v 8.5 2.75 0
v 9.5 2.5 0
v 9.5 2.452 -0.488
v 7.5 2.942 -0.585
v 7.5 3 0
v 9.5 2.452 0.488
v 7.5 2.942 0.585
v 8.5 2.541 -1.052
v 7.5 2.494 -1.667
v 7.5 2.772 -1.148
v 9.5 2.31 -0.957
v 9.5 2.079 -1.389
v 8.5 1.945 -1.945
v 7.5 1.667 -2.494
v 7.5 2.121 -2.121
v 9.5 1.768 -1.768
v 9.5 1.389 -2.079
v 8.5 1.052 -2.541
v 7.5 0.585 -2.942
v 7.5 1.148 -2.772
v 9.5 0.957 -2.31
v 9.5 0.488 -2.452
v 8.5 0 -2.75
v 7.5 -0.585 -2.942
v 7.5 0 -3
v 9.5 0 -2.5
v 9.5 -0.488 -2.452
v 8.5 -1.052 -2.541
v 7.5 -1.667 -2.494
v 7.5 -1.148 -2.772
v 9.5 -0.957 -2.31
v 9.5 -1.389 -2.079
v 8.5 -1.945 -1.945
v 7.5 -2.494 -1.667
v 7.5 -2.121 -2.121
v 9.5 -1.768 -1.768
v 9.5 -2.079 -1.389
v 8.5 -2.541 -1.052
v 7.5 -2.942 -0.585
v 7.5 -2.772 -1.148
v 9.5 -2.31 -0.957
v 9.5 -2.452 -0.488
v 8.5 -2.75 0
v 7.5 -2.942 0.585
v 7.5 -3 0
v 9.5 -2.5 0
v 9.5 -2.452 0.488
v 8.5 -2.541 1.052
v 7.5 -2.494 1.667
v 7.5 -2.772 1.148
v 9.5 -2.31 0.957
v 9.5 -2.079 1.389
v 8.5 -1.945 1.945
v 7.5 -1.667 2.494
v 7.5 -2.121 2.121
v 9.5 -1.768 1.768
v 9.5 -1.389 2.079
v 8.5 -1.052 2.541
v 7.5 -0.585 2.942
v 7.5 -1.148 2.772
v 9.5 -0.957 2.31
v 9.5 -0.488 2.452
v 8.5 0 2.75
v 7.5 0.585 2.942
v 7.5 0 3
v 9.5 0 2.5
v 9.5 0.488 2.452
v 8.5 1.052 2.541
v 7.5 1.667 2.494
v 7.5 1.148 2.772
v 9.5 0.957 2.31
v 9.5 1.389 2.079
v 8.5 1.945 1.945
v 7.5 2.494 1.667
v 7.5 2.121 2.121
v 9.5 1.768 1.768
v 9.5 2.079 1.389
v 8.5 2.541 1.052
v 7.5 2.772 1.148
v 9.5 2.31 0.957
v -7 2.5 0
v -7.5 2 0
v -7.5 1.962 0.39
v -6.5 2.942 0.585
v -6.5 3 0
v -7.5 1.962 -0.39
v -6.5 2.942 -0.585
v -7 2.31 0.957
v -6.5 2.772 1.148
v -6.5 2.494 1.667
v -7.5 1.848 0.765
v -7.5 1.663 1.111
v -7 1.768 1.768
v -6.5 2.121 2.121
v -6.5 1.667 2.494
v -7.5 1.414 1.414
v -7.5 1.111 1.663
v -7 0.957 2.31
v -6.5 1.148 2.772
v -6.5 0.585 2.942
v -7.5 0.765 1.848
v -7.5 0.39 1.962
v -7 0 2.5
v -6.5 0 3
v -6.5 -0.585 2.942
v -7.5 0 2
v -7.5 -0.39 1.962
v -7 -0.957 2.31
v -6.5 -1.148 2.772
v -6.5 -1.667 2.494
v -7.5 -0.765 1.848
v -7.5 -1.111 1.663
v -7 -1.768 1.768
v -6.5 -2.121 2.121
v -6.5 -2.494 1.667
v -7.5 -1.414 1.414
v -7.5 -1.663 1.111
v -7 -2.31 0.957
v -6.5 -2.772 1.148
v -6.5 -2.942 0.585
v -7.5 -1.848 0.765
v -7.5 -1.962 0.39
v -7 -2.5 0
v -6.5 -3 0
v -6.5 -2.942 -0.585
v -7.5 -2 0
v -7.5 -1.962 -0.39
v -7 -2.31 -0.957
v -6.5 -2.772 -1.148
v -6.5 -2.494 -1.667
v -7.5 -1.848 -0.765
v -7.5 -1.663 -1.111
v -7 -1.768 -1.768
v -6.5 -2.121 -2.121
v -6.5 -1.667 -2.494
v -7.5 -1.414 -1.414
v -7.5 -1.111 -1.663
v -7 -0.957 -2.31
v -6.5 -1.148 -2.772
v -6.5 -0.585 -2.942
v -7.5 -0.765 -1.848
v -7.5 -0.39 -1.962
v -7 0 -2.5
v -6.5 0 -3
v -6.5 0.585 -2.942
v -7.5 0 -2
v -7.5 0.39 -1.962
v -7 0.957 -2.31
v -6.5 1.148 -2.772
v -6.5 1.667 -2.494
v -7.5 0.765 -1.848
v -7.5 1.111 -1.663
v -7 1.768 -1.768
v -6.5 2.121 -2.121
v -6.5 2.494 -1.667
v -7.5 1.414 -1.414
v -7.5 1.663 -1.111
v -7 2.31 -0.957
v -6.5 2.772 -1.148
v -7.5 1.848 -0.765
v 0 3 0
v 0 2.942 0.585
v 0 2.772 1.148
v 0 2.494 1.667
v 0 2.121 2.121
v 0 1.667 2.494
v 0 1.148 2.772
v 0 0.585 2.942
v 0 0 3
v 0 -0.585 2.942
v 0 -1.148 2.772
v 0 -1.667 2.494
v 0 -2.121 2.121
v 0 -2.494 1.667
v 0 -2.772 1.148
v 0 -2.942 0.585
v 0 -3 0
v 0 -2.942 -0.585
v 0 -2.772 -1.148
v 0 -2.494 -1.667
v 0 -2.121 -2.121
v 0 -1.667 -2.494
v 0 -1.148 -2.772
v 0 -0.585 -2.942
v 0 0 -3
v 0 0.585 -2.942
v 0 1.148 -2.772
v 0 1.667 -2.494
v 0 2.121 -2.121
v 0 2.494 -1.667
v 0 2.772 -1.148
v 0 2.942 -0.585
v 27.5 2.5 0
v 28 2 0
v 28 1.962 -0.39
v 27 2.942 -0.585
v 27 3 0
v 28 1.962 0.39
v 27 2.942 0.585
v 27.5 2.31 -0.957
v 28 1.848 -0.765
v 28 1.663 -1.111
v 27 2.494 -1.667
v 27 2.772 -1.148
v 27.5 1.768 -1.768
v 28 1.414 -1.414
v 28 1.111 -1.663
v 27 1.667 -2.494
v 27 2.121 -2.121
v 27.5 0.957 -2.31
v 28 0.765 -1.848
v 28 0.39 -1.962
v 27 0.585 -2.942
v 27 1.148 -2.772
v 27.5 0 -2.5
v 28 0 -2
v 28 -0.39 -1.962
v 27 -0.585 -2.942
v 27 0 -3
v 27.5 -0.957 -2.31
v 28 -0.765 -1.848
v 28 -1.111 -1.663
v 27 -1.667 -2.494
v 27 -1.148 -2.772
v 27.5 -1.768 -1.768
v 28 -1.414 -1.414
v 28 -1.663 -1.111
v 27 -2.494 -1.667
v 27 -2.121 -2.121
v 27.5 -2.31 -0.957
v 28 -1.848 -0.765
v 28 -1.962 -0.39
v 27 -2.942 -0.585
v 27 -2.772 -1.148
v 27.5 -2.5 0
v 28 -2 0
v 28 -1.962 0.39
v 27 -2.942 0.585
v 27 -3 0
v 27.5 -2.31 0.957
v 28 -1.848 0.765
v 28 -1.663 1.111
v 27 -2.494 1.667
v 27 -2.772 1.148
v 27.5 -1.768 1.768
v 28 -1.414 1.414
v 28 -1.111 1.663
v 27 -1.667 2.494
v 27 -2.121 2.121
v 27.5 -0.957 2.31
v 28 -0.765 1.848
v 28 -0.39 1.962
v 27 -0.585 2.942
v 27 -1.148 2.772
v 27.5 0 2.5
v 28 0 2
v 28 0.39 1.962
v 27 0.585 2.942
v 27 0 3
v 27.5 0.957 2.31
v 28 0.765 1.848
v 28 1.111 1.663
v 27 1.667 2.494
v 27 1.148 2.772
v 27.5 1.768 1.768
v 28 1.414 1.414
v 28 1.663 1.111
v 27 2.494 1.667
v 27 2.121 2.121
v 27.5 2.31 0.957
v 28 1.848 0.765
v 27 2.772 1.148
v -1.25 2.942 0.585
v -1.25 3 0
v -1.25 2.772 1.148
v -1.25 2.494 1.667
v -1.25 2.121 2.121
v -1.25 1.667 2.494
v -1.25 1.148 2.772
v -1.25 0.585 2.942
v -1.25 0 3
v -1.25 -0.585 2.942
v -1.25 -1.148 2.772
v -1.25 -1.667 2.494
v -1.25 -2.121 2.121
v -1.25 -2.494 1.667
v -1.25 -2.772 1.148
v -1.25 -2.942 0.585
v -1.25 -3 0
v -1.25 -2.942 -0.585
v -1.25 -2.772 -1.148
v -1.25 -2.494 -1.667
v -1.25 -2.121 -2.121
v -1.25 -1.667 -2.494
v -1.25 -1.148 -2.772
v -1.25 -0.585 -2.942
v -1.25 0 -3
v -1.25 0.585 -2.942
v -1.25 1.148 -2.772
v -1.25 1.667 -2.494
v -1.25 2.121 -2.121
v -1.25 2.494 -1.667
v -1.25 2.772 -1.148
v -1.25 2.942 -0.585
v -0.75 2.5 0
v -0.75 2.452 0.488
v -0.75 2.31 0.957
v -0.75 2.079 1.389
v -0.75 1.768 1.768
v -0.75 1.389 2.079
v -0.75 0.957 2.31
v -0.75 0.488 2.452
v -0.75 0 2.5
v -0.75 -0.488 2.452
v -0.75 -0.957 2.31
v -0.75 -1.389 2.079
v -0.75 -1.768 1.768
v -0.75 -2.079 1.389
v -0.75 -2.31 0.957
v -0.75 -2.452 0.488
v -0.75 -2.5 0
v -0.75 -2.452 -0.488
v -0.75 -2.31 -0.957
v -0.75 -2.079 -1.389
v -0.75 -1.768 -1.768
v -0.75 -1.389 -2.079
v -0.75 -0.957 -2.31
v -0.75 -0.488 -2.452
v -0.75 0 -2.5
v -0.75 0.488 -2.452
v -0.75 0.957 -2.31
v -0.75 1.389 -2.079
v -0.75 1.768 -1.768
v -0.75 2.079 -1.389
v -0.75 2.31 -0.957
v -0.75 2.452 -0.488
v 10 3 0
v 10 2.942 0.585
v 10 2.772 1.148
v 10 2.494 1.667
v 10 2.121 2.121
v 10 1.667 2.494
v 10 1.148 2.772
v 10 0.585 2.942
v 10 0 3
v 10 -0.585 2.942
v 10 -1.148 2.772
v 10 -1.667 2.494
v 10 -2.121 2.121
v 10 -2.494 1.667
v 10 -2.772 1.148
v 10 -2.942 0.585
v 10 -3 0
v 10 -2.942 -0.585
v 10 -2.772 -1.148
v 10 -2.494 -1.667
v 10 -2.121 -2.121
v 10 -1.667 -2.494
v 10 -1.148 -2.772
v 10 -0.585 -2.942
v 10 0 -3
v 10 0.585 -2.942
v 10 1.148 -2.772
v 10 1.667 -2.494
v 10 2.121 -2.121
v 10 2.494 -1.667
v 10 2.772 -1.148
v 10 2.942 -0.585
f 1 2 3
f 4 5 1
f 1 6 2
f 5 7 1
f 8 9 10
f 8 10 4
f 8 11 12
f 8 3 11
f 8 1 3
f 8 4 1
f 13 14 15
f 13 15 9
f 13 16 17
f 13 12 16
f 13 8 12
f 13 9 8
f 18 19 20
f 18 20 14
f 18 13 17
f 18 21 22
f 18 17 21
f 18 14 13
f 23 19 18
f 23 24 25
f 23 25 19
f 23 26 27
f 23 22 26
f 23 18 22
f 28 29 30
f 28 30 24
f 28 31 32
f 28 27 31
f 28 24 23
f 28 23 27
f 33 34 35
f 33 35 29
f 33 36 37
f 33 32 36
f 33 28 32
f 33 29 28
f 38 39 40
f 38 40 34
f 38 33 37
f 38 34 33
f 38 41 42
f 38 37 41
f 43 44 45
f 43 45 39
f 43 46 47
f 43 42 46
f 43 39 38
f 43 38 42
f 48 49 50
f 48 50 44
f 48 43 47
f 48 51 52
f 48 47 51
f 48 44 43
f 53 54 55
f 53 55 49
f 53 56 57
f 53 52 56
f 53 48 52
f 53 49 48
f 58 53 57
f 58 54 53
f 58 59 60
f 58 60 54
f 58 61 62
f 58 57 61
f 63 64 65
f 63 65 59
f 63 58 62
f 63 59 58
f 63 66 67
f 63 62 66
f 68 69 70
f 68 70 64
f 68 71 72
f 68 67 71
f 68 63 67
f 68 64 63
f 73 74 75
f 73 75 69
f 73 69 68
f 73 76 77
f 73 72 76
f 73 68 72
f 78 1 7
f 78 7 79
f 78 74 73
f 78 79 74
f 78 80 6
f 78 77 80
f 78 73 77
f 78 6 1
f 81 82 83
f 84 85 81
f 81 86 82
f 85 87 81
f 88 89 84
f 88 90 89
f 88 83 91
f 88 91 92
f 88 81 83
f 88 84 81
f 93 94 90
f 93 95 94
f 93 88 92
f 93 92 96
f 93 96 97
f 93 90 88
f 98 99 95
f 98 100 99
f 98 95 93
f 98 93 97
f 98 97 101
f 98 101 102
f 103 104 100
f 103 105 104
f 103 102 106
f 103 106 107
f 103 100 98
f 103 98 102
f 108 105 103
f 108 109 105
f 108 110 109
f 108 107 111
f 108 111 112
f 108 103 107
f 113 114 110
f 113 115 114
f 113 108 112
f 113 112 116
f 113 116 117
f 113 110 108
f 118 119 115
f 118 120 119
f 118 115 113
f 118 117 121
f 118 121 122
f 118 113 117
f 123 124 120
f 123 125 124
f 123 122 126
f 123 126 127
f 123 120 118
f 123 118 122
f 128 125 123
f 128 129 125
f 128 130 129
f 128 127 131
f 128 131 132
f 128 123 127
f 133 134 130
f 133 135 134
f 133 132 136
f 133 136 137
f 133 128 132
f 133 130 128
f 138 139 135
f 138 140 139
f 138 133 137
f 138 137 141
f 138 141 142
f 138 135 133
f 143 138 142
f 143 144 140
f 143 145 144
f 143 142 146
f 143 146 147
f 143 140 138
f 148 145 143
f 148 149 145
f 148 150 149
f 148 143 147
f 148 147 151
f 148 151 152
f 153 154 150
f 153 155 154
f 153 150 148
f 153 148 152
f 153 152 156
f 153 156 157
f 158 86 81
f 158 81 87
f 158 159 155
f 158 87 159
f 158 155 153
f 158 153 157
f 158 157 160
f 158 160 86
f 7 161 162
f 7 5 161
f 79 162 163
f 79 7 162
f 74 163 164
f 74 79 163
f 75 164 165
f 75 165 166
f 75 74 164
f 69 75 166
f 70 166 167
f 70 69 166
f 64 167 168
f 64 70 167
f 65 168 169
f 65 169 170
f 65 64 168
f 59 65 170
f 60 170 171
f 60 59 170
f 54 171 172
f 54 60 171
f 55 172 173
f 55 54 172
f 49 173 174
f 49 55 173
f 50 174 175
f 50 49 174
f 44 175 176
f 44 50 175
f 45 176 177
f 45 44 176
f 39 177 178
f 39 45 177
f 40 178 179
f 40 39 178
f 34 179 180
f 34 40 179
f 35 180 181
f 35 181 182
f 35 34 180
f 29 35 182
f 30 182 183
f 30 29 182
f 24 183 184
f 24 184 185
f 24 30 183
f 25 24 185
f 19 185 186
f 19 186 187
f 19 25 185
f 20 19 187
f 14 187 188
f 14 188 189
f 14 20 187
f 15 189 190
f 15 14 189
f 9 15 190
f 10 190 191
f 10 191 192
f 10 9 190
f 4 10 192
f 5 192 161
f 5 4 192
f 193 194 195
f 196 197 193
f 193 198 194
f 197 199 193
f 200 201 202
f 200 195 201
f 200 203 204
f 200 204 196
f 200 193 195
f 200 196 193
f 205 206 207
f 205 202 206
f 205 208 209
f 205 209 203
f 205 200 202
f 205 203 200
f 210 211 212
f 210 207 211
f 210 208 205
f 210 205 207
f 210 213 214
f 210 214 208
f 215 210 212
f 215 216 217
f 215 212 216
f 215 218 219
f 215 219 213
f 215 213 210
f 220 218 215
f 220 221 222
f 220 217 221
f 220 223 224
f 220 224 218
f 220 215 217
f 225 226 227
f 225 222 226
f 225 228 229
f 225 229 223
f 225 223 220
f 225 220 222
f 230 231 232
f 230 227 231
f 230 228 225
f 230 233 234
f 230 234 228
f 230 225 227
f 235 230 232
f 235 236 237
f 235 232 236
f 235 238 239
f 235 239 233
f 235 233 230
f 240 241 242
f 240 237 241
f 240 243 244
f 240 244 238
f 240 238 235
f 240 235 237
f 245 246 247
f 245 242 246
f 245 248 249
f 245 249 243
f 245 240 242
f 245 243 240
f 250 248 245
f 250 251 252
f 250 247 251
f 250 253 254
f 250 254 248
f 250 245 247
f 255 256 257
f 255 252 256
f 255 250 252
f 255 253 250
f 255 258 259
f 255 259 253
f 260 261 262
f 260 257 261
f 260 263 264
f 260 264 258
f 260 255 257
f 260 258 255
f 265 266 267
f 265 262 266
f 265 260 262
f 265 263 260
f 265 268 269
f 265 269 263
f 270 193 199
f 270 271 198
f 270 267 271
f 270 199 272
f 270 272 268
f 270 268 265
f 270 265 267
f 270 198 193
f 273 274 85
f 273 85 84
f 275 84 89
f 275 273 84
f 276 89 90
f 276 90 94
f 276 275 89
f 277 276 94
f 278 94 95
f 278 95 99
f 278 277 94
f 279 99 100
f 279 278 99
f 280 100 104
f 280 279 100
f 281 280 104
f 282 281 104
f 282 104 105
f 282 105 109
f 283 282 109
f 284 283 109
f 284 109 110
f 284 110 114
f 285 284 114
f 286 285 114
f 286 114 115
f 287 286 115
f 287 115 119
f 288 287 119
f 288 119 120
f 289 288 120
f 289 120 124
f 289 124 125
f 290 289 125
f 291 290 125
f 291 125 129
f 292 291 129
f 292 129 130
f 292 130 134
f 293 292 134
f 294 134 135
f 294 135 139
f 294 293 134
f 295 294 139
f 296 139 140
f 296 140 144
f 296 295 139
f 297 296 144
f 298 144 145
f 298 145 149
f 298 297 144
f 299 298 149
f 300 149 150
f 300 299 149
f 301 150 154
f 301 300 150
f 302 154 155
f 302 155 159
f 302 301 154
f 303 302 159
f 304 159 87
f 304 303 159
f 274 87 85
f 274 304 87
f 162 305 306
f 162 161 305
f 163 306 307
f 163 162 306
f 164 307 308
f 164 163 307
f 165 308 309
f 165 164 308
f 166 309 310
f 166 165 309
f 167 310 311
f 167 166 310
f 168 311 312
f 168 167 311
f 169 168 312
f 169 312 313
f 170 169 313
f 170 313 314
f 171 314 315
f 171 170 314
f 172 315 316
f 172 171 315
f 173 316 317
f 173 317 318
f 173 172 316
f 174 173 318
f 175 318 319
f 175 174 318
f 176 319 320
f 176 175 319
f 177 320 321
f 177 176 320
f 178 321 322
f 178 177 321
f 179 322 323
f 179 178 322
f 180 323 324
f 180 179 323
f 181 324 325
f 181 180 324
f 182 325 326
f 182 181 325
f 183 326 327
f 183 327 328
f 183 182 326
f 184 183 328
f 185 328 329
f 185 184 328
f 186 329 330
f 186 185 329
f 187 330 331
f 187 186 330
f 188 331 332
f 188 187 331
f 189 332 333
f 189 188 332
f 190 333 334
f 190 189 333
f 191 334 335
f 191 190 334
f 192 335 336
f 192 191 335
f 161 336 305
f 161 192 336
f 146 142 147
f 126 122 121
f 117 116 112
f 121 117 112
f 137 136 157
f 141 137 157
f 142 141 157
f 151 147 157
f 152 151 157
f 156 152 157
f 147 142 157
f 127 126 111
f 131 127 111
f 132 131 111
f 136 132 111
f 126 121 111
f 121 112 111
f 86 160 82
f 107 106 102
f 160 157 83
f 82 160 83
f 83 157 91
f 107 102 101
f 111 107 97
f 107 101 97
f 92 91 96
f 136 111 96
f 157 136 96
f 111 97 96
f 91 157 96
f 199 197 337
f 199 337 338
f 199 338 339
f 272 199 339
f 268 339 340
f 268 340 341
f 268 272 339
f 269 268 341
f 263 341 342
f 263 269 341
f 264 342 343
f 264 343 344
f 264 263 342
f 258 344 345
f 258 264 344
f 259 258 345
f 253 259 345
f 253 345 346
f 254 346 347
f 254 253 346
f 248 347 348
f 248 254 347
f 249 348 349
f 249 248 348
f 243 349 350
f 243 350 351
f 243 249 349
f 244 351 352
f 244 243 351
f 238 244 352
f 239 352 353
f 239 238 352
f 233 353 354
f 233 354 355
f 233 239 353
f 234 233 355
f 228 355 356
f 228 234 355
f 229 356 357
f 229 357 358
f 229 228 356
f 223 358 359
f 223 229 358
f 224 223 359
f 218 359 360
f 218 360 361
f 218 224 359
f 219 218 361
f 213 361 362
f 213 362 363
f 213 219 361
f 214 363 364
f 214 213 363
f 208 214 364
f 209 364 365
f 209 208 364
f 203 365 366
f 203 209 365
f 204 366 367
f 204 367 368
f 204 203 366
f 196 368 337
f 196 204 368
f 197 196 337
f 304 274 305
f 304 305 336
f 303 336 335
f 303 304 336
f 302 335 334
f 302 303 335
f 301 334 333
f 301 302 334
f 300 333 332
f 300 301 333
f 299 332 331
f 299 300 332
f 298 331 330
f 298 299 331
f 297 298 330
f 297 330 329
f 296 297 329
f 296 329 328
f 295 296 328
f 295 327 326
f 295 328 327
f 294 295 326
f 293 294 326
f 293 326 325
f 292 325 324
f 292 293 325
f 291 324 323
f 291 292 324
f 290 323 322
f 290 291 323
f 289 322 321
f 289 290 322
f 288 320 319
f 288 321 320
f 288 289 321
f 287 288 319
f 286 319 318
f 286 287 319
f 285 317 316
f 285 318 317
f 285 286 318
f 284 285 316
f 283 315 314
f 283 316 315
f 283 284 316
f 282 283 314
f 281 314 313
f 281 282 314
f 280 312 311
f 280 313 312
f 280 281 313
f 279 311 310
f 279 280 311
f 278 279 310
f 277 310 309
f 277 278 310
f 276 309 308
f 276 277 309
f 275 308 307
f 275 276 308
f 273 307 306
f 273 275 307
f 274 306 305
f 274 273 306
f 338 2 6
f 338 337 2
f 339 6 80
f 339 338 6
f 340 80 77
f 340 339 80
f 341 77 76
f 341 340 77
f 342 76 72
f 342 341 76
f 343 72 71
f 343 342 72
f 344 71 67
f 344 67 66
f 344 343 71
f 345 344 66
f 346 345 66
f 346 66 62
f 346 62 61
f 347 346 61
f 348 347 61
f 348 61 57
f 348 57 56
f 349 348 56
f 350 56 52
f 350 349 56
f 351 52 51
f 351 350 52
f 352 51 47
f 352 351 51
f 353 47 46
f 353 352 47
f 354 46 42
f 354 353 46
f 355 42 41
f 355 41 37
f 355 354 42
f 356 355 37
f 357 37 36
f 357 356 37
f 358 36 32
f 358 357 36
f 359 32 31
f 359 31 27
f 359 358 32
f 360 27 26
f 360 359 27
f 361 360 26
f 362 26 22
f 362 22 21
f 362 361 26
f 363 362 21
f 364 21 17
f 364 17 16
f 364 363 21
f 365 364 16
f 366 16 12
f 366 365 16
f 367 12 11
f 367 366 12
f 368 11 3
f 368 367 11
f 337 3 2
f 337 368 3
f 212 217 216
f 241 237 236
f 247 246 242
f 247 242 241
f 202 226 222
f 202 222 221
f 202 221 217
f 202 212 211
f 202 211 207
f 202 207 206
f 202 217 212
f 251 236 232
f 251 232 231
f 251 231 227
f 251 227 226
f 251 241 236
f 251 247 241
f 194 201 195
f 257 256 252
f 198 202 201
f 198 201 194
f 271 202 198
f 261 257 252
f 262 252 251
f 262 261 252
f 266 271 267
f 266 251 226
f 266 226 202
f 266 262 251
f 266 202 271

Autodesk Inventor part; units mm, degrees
ref_plane "YZ Plane" through (0, 0, 0) normal (1, 0, 0) x (0, 1, 0)
ref_plane "XZ Plane" through (0, 0, 0) normal (0, 1, 0) x (-1, 0, 0)
sketch "Szkic1" plane through (0, 0, 0) normal (0, 0, 1) x (1, 0, 0)
  line L0 (28, 3) -> (28, 0)
  line L1 (-7.5, 0) -> (28, 0)
  line L2 (-14.6, 0) -> (35.1, 0) projected
  line L3 (0, 3.6) -> (0, -0.6) projected
  line L4 (-7.5, 3) -> (-7.5, 0)
  line L5 (10, 3) -> (10, 0) construction
  line L6 (-14.6, 0) -> (35.1, 0) projected
  line L7 (-7.5, 3) -> (28, 3)
  dimension "d4" = 7.5
  dimension "d5" = 28
  dimension "d6" = 18
  dimension "d13" = 6
revolve "Bryła" add sketch "Szkic1" angle 360 about axis through (-7.5, 0, 0) along (1, 0, 0)
thread "Gwint1" size "M6x1" class "6g" standard "ISO Metric profile" length 7.5
thread "Gwint2" size "M6x1" class "6g" standard "ISO Metric profile" length 18
chamfer "Faza1" distance 1 angle 45 1 edges at (-7.5, -3, 0) measured on face at (16.1667, 2.9903, -0.2414)
chamfer "Faza2" distance 1 angle 45 1 edges at (28, -3, 0) measured on face at (16.5, 2.9903, -0.2414)
sketch "Sketch5" plane through (0, 0, 0) normal (0, 0, 1) x (1, 0, 0)
  line L0 (-6.5, 3) -> (27, 3) projected
  line L1 (-6.5, -3) -> (27, -3) projected
  line L2 (28, 2) -> (28, -2) projected
  line L3 (-7.5, -2) -> (-7.5, 2) projected
  line L4 (10, 3) -> (9.5, 2.5)
  line L5 (9.5, 2.5) -> (7.5, 3)
  line L6 (-14.6, 0) -> (35.1, 0) projected
  point P0 (0, 0)
  dimension "d87" = 45
  dimension "d90" = 18
  dimension "d91" = 0.5
  dimension "d92" = 2.5
revolve "IDS_REVOLUTION{1}" cut sketch "Sketch5" angle 360 about axis through (-10, 0, 0) along (1, 0, 0)
sketch "Sketch6" plane through (0, 0, 0) normal (0, 0, 1) x (1, 0, 0)
  line L0 (-6.5, 3) -> (7.5, 3) projected
  line L1 (-7.5, -2) -> (-7.5, 2) projected
  line L2 (-1.25, 3) -> (-0.75, 2.5)
  line L3 (-0.75, 2.5) -> (0, 3)
  line L4 (-10.5, 0) -> (10.5, 0) projected
  point P0 (0, 0)
  dimension "d94" = 45
  dimension "d95" = 7.5
  dimension "d96" = 0.5
  dimension "d97" = 1.25
revolve "IDS_REVOLUTION{2}" cut sketch "Sketch6" angle 360 about axis through (-10, 0, 0) along (1, 0, 0)
ref_plane "Work Plane1" through (2.75, 0, 0) normal (0, -1, 0) x (1, 0, 0)
equation "\"d4\" = KOH"
equation "\"d5\" = NLG"
equation "\"d6\" = GEL"
equation "\"d13\" = GD"
equation "\"d1\" = KOH"
equation "\"d7\" = GEL"
equation "\"d9\" = -0.5 * SPD + 0.5 * GD"
equation "\"d10\" = -0.5 * SPD + 0.5 * GD"
equation "\"d11\" = -0.5 * SPD + 0.5 * GD"
equation "\"d12\" = -0.5 * SPD + 0.5 * GD"
equation "\"d90\" = GEL"
equation "\"d91\" = -0.25 * SPD + 0.25 * GD"
equation "\"d92\" = X1"
equation "\"d95\" = KOH"
equation "\"d96\" = -0.25 * SPD + 0.25 * GD"
equation "\"d97\" = X2"
equation "\"NLG\" = 28"
equation "\"GEL\" = 18"
equation "\"GAL\" = 0.61345 * PTC"
equation "\"SPD\" = 4"
equation "\"d0\" = GD"
equation "\"GUL\" = 0.61345 * PTC"
equation "\"KOH\" = 7.5"
equation "\"GD\" = 6"
equation "\"BDM\" = NND"
equation "\"GUL1\" = GUL"
equation "\"GAL1\" = GAL"
equation "\"d80\" = -GUL - GEL"
equation "\"d86\" = -KOH + GUL1"
equation "\"X1\" = 2.5"
equation "\"X2\" = 1.25"
equation "\"PTC\" = 1"
equation "\"THREADDIA\" = 6"
equation "\"TOA\" = 30deg"
equation "\"NND\" = 6"
equation "\"GD1\" = THREADDIA - 1.2269 * PTC"
properties part number "DIN 939 - M6 x 28" material "Stal, miękka"
